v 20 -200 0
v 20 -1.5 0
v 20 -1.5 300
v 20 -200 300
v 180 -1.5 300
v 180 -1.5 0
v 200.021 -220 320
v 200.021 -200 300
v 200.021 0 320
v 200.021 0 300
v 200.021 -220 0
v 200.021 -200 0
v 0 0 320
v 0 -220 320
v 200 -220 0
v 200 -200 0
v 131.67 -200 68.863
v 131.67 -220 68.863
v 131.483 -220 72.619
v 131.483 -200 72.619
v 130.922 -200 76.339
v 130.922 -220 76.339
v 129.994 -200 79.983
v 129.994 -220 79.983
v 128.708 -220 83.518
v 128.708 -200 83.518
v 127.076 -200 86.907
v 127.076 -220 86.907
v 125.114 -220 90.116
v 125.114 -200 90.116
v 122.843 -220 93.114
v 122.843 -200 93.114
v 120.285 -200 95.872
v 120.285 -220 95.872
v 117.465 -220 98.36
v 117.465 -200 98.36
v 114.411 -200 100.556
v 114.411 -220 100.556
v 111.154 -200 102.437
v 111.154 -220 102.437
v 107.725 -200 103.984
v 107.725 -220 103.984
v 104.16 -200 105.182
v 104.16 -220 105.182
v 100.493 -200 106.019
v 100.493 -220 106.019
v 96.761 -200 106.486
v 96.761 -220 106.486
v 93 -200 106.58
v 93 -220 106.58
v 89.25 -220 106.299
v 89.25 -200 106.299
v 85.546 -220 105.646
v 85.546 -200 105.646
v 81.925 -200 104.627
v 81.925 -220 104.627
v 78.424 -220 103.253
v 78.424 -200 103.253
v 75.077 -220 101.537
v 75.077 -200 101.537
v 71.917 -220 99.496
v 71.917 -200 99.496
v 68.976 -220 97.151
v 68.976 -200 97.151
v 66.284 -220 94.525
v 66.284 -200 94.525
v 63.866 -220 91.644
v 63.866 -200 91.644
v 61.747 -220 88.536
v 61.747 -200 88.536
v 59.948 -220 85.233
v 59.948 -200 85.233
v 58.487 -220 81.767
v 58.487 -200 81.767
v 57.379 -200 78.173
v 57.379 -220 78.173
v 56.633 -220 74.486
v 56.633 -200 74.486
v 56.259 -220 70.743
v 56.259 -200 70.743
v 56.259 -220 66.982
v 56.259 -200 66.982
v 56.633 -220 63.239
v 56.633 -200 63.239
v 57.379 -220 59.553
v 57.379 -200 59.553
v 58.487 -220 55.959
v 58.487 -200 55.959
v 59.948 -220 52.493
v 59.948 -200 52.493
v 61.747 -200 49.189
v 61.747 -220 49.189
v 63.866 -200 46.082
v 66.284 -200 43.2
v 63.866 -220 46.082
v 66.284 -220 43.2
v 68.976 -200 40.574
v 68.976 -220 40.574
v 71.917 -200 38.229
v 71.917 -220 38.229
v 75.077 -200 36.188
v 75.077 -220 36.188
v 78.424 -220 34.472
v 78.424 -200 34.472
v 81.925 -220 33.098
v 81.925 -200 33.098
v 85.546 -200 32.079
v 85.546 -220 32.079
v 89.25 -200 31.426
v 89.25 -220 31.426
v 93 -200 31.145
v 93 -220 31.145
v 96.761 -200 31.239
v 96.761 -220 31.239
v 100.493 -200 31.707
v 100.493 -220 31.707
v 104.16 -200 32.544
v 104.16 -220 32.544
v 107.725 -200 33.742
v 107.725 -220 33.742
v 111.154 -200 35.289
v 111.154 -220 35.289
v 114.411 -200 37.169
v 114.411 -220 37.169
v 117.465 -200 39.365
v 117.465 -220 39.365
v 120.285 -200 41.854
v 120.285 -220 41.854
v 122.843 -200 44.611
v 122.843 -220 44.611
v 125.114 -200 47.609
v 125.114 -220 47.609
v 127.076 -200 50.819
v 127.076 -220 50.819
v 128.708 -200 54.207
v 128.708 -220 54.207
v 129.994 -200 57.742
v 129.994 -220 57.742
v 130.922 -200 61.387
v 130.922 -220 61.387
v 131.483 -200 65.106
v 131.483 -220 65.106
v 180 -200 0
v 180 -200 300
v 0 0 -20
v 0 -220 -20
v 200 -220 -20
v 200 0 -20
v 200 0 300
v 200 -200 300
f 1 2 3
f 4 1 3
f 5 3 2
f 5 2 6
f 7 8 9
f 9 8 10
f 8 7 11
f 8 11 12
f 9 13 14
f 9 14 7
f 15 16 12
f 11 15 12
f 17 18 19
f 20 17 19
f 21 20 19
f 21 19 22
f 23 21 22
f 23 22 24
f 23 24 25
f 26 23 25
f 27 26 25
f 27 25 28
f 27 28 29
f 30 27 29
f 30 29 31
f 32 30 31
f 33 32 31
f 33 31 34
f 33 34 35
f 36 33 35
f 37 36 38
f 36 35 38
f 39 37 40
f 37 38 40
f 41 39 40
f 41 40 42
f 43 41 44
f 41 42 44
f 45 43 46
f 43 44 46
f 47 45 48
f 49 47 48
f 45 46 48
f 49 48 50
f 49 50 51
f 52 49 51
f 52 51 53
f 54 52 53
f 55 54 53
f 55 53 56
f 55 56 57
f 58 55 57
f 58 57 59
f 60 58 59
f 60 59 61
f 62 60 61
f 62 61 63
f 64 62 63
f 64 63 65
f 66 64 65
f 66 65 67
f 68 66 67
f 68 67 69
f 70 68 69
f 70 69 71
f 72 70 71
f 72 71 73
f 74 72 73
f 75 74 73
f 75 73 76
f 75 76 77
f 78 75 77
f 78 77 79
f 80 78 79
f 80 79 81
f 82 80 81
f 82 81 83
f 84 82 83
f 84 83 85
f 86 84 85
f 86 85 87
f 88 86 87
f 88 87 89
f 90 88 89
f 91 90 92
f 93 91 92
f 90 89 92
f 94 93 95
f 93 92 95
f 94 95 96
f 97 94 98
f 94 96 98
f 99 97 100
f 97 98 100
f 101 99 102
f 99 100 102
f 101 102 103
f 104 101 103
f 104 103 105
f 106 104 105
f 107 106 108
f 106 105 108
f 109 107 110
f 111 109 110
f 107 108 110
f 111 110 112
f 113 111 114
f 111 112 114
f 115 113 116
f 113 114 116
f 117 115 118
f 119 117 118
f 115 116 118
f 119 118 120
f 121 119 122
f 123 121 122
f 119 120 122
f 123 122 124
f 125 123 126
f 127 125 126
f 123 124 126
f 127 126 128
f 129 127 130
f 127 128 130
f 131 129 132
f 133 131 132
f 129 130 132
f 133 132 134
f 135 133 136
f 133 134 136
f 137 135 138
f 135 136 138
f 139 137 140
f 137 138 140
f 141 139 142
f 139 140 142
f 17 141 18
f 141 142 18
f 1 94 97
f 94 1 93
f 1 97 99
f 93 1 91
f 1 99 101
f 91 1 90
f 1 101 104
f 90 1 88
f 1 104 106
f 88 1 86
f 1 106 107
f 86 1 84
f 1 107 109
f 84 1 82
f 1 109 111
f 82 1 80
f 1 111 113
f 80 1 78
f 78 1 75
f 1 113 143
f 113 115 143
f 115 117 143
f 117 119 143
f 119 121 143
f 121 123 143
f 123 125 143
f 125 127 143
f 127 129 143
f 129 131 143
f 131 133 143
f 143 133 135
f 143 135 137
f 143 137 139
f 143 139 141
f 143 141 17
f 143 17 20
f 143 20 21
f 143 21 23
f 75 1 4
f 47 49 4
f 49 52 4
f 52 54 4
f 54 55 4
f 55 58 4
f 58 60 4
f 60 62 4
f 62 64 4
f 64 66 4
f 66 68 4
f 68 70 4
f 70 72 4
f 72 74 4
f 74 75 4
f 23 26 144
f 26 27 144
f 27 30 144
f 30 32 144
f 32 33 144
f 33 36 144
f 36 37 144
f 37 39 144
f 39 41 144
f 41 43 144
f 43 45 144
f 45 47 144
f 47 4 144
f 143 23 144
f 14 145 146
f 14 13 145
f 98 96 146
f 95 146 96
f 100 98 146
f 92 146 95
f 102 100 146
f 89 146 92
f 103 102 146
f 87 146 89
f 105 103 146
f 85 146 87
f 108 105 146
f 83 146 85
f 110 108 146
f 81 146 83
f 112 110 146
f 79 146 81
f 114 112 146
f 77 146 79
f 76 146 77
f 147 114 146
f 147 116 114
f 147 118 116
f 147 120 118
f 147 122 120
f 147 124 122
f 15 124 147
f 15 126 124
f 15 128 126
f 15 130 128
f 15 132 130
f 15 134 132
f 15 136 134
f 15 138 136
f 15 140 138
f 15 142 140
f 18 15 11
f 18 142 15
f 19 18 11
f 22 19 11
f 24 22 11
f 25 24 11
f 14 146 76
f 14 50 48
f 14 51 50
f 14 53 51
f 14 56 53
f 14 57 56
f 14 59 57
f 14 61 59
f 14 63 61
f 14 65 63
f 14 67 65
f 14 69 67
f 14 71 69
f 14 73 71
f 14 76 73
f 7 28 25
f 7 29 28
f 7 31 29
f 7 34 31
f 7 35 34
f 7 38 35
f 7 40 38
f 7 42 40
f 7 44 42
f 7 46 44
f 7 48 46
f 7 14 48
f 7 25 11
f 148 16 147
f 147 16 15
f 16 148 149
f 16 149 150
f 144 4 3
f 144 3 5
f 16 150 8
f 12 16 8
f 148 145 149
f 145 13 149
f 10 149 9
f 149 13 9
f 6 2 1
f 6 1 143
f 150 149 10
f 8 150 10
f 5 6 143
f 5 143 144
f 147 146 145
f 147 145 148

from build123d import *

# Parameters (mm, degrees)
F0_W      = 200
F0_H      = 300
F1_DEPTH  = 1.5
F2_W      = 20
F2_H      = 300
F3_DEPTH  = 200
F4_W      = 20
F4_H      = 300
F5_DEPTH  = 200
F6_W      = 200.020596385
F6_H      = 300
F7_DEPTH  = 20
F8_W      = 200.020596385
F8_H      = 220
F9_DEPTH  = 20
F10_W     = 200
F10_H     = 220
F9_FACE_W = 200.020596385
F9_FACE_H = 220
F11_DEPTH = 20
F12_R     = 37.7291008544
F13_DEPTH = 92


with BuildPart() as f1:
    # F0 (on Front) → F1 (new body)
    with BuildSketch(Plane.XZ):
        with Locations((100, 150)):
            Rectangle(F0_W, F0_H)
    extrude(amount=F1_DEPTH)

    # F2 (on Front) → F3 (join)
    with BuildSketch(Plane.XZ):
        with Locations((10, 150)):
            Rectangle(F2_W, F2_H)
    extrude(amount=F3_DEPTH)

    # F4 (on face) → F5 (join)
    with BuildSketch(Plane.XZ.offset(1.5)):
        with Locations((190, 150)):
            Rectangle(F4_W, F4_H)
    extrude(amount=F5_DEPTH)

    # F6 (on face) → F7 (join)
    with BuildSketch(Plane.XZ.offset(200)):
        with Locations((100.0102981925, 150)):
            Rectangle(F6_W, F6_H)
    extrude(amount=F7_DEPTH)

    # F8 (on face) → F9 (join)
    with BuildSketch(Plane.XY.offset(300)):
        with Locations((100.0102981925, -110)):
            Rectangle(F8_W, F8_H)
    extrude(amount=F9_DEPTH)

    # F10 (on face) + F9_face (on face) → F11 (join)
    with BuildSketch(Plane(origin=(0, 0, 0), x_dir=(1, 0, 0), z_dir=(0, 0, -1))):
        with Locations((100, 110)):
            Rectangle(F10_W, F10_H)
    with BuildSketch(Plane(origin=(100.0102981925, -110, 320), x_dir=(1, 0, 0), z_dir=(0, 0, 1))):
        Rectangle(F9_FACE_W, F9_FACE_H)
    extrude(amount=F11_DEPTH, dir=(0, 0, -1))

    # F12 (on face) → F13 (cut)
    with BuildSketch(Plane.XZ.offset(220)):
        with Locations((93.9410999417, 68.8626393676)):
            Circle(F12_R)
    extrude(amount=-F13_DEPTH, mode=Mode.SUBTRACT)


solid = f1.part
